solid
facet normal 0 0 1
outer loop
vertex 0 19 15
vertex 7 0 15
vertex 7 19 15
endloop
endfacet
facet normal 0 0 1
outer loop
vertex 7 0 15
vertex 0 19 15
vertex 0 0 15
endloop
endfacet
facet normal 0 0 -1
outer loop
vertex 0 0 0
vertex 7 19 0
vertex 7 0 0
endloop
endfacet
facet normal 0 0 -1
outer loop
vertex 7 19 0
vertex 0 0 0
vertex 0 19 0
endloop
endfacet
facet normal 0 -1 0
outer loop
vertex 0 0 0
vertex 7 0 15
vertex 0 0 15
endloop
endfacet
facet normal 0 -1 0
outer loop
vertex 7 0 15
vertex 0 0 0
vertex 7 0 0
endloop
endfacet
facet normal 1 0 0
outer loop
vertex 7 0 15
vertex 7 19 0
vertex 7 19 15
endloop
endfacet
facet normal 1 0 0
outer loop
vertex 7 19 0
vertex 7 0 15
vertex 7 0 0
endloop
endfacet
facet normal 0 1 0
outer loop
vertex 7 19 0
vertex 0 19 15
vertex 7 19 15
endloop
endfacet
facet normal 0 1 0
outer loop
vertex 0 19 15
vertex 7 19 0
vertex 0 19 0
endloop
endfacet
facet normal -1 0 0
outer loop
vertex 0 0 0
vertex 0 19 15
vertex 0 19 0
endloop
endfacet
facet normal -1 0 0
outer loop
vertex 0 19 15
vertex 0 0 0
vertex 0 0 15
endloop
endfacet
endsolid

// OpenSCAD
// Generated by SolidPython 1.0.1 on 2020-07-29 00:46:55


cube(size = [7, 19, 15]);
/***********************************************
*********      SolidPython code:      **********
************************************************
 
# import packages: SolidPython
from solid import *
from solid.utils import *
from itertools import chain, combinations, permutations


class Resize:

    def __init__(self, scad_file):
        self.scad_file = scad_file
        #self.scad_file = import_scad(scad_file)
        # cone/cylinder param:
        self.r1 = 0
        self.r2 = 0
        self.h = 0
        # rectangular prism param:
        self.w = 0
        self.l = 0
        # ellipse param:
        self.r = 0

    # import OpenScad code (file name corresponds to shape)


    # classify shape + parameters
    def assign(self, param1, param2, param3):
        if self.scad_file == 'cone.scad':
            self.r1 = param1
            self.r2 = param2
            self.h = param3
        elif self.scad_file == 'cylinder.scad':
            self.r1 = param1
            self.r2 = param2
            self.h = param3
        elif self.scad_file == 'rectangularPrism.scad':
            self.h = param1
            self.l = param2
            self.w = param3
        else:
            self.r = param1
            self.h = param2

    # resize parameters
    def iterate(self):
        x = range(3, 20, 2)
        i = 1
        if self.scad_file == 'cone.scad':
            tempList = list(permutations(x, 2))
            for temp in tempList:
                param1 = temp[0]
                param2 = temp[1]
                filepath = 'produced_scad_files/' + 'cone' + str(param1) + '_' + str(param2) + '_' + '.scad'
                scad_render_to_file(cylinder(h=param1, r1=param2, r2=0), filepath)

        elif self.scad_file == 'cylinder.scad':
            tempList = list(permutations(x, 3))
            for temp in tempList:
                param1 = temp[0]
                param2 = temp[1]
                filepath = 'produced_scad_files/' + 'cylinder' + str(param1) + '_' + str(param2) + '_' + '.scad'
                scad_render_to_file(cylinder(h=param1, r1=param2, r2=param2), filepath)

        elif self.scad_file == 'rectangularPrism.scad':
            tempList = list(permutations(x, 3))
            for temp in tempList:
                param1 = temp[0]
                param2 = temp[1]
                param3 = temp[2]
                filepath = 'produced_scad_files/' + 'rectangularPrism' + str(param1) + '_' + str(param2) + '_' + str(
                    param3) + '.scad'
                scad_render_to_file(cube(size=(param1, param2, param3)), filepath)

        elif self.scad_file == 'ellipse.scad':
            tempList = list(permutations(x, 4))
            for temp in tempList:
                param1 = temp[0]
                param2 = temp[1]
                param3 = temp[2]
                param4 = temp[3]
                filepath = 'produced_scad_files/' + 'ellipse' + str(param1) + '_' + str(param2) + '_' + str(param3) + '_' + str(param4) + '.scad'
                scad_render_to_file(scale([param1, param2, param3])(sphere(r=param4)), filepath)

    def render_to_scadfile(self):
        scad_render_to_file(scad, 'example.scad') 
 
************************************************/
